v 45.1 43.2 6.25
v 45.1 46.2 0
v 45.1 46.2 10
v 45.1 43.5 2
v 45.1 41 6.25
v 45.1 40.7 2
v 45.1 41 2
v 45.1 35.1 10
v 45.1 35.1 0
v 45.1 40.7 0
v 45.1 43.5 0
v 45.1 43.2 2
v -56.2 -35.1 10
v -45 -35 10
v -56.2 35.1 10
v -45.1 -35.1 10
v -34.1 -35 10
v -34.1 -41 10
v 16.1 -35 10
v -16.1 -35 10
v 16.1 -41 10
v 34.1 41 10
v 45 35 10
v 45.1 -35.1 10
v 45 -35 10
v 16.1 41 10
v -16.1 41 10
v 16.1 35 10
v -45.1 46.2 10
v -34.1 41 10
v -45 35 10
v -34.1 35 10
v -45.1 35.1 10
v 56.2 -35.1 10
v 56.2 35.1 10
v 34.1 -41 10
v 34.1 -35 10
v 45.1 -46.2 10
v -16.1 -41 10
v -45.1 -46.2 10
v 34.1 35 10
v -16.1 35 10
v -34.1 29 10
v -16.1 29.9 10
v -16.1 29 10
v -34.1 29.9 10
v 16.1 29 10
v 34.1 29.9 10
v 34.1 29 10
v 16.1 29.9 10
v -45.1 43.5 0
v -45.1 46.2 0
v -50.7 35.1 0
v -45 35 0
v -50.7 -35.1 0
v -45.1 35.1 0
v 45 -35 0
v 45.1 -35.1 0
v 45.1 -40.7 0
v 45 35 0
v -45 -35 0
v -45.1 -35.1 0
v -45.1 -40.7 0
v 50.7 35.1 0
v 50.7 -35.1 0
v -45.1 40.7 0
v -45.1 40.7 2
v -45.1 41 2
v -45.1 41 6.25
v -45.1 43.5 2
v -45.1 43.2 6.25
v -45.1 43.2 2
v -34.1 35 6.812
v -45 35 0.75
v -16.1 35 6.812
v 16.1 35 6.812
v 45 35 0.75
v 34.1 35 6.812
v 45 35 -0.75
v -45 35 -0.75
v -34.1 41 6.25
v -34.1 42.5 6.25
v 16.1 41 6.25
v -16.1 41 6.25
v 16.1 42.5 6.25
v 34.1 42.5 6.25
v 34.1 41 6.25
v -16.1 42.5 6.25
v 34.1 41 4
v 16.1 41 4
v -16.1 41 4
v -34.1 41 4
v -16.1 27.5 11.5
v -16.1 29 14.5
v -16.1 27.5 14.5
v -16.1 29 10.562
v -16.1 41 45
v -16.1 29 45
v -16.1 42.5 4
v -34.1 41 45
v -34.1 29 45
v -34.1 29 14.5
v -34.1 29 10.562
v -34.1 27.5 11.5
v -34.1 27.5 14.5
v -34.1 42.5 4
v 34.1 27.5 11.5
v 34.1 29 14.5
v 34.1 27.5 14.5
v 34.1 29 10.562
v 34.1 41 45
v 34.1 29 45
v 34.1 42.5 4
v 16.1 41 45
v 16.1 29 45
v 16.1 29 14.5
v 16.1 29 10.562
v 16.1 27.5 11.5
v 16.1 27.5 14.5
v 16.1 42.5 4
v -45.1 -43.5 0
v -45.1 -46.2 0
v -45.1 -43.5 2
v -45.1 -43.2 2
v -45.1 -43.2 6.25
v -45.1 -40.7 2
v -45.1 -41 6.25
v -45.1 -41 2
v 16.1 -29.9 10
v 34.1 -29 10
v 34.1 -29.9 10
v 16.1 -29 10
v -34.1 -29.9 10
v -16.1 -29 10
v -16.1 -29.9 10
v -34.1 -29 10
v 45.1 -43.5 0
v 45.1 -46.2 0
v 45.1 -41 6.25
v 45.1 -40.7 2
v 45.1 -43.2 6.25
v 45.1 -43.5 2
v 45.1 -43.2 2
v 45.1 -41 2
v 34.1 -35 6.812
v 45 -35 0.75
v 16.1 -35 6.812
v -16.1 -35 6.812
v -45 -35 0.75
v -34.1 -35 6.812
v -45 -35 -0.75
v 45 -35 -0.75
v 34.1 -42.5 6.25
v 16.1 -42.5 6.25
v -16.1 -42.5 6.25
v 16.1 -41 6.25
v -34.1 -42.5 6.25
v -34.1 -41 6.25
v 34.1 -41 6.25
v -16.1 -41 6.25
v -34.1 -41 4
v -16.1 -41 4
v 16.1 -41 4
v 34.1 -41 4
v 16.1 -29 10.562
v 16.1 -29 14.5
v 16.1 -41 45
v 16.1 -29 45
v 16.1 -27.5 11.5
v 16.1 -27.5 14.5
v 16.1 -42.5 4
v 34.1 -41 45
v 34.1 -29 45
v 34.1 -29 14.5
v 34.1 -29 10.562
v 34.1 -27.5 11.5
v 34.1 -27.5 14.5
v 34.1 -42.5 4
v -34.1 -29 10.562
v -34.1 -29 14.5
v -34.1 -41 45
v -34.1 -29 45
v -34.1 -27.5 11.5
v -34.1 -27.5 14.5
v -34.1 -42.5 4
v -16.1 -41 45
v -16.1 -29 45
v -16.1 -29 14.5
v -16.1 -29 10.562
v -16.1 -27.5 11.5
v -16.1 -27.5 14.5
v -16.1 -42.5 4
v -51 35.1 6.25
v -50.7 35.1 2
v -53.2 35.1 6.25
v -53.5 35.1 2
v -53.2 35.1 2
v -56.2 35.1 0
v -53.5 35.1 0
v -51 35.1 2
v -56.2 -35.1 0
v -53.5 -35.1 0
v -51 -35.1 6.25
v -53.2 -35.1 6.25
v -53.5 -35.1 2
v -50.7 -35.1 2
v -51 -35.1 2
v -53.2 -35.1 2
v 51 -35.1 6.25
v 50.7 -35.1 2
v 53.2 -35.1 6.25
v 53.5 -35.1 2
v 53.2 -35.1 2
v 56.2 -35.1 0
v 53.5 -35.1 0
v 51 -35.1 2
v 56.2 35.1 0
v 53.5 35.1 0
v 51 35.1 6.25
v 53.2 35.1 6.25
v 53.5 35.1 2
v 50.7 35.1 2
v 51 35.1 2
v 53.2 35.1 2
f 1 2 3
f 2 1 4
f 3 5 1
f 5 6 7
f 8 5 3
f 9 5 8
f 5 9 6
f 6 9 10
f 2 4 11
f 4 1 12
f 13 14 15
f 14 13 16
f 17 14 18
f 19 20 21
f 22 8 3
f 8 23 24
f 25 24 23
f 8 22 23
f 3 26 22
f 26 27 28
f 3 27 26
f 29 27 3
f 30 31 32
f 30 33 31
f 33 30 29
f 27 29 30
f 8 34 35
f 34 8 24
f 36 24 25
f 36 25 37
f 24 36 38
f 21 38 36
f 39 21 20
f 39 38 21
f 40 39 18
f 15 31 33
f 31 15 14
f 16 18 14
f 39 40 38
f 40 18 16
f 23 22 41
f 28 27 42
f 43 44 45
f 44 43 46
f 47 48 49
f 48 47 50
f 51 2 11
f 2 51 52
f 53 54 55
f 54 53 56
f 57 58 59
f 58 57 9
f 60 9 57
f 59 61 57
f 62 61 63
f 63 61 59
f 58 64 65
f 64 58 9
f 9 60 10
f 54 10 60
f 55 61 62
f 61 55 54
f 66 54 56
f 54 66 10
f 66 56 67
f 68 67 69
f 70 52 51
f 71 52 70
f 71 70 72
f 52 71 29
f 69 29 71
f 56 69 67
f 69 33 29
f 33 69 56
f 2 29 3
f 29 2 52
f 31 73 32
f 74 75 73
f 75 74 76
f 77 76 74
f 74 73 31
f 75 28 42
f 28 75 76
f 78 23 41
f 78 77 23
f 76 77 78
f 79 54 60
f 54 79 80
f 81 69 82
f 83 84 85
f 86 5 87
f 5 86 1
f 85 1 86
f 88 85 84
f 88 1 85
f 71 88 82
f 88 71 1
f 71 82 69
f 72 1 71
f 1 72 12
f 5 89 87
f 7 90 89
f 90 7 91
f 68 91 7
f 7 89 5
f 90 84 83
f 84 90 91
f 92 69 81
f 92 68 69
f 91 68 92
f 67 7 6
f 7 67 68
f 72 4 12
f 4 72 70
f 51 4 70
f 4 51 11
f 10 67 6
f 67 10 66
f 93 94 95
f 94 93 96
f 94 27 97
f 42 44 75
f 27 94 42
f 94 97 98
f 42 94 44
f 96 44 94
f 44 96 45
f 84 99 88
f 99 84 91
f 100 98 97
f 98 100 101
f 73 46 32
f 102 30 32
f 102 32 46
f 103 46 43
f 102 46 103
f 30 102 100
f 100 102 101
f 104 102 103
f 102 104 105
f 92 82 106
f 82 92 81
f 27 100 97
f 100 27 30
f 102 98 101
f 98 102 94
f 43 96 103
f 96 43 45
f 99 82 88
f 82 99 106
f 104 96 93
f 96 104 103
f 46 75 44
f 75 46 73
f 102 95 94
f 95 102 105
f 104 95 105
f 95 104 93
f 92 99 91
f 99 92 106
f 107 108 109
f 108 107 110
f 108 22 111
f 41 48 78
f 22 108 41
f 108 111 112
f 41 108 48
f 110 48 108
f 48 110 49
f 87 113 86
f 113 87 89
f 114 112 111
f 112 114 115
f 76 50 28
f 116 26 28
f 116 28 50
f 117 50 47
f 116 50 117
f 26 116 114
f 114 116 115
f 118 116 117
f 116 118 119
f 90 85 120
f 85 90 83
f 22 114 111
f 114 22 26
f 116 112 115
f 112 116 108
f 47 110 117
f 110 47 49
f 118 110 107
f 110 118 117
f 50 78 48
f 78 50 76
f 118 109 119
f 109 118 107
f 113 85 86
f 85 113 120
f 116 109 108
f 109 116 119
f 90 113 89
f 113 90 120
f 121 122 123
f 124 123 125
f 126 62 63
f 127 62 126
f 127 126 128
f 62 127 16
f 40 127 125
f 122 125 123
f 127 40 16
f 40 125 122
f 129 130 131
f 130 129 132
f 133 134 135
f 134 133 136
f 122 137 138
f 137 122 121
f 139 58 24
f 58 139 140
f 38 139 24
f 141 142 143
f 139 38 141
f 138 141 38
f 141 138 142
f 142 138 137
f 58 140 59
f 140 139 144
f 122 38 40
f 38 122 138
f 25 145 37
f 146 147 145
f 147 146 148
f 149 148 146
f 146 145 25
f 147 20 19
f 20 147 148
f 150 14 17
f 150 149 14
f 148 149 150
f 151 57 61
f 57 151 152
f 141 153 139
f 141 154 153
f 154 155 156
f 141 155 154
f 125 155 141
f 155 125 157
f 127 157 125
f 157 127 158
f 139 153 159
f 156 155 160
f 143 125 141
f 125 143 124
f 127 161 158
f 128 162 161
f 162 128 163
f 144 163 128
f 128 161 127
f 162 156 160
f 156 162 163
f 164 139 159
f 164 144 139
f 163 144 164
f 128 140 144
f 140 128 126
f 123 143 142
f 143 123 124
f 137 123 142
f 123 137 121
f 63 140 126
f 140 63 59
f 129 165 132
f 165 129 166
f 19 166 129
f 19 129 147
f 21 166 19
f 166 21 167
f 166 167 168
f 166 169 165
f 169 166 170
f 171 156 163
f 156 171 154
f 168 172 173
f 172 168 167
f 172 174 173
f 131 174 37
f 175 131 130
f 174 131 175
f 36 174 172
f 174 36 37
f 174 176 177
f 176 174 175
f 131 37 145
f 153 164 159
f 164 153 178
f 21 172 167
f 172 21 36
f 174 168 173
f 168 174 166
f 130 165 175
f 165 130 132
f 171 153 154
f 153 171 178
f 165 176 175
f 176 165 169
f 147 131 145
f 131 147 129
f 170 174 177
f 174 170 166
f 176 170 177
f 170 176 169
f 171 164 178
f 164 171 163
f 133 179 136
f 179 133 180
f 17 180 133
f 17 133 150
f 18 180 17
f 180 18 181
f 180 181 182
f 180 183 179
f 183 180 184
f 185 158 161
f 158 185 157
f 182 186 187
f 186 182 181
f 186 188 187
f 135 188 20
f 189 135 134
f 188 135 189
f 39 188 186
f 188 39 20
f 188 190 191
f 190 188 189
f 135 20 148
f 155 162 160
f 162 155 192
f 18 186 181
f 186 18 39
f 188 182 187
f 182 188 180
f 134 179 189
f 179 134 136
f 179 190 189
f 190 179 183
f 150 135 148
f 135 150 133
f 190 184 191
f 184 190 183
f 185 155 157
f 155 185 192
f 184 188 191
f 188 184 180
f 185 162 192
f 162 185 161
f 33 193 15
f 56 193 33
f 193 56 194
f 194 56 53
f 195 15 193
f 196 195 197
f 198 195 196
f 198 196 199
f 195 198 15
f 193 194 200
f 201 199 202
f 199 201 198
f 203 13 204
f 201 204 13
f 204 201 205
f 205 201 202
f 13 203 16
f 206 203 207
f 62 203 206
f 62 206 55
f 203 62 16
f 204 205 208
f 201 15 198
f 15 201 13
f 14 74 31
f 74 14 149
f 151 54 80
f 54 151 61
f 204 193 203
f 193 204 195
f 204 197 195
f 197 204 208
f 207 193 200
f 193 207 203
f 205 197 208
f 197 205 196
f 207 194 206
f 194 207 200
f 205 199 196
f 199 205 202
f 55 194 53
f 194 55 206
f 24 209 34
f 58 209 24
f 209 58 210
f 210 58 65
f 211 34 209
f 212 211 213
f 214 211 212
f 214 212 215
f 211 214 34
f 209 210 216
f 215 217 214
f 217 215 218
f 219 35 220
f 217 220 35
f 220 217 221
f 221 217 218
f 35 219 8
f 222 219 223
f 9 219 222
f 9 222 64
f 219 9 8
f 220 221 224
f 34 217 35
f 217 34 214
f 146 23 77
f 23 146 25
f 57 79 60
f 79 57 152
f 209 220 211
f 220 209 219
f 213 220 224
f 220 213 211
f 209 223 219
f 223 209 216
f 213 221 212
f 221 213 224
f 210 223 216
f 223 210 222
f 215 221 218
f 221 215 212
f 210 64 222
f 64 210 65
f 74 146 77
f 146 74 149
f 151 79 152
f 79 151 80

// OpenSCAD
// 4-piece PCB perimeter frame: 4 U-channel rails (glue-on)
// - PCB slides into the U on each rail
// - Print 2x plain rails + 2x leg rails
// - Configure which sides get legs by printing the leg variant for those sides
//
// PCB: 90 x 70 x 1.5 mm
// Units: mm

// ---------------- PCB ----------------
pcb_x  = 90;
pcb_y  = 70;
pcb_t  = 1.5;

// ---------------- Fit ----------------
slot_clear_xy = 0.35;   // clearance for PCB thickness slot width (per side in slot)
slot_clear_z  = 0.25;   // clearance depth-wise (not critical here)
end_clear     = 0.2;    // extra length so rail doesn't bind at ends

// ---------------- Rail geometry ----------------
rail_len_x = pcb_x + end_clear;  // rail length for top/bottom pieces
rail_len_y = pcb_y + end_clear;  // rail length for left/right pieces

rail_depth = 10.0;      // how far rail extends "back" (Z direction) from PCB plane
rail_face  = 3.0;       // front lip thickness (toward viewer)
rail_wall  = 3.0;       // wall thickness around slot
slot_depth = 6.0;       // how deep PCB inserts into the rail (>= pcb_t)

// Slot (U-channel) size
slot_w = pcb_t + 2*slot_clear_xy;        // opening thickness for PCB
slot_h = slot_depth + slot_clear_z;      // insertion depth into rail

// ---------------- Legs (optional on two rails) ----------------
leg_enable = true;
leg_width  = 18.0;   // along rail length
leg_th     = 3.0;    // thickness
leg_len    = 35.0;   // how far it sticks out behind (Z)
leg_drop   = 12.0;   // how far down (Y-) the foot goes
leg_offset = 20.0;   // from rail end toward center

// ---------------- Rendering ----------------
part = "assembly"; // "rail_plain_x", "rail_plain_y", "rail_leg_x", "rail_leg_y", "assembly"

// ------------- Core rail (length L) -------------
// Coordinate system for rail:
// X = along rail length
// Y = vertical (up/down when standing)
// Z = depth (front/back). PCB sits at Z=0 plane; rail extends +Z behind.
module rail(L, with_leg=false) {

  // Outer box of rail
  // Height in Y: make it look like a picture frame edge
  outer_y = rail_face + rail_wall + slot_w + rail_wall; // total "height" around slot
  outer_z = rail_depth;                                  // depth/back

  // Slot center in Y: keep some "face" above the slot so it looks framed
  // Slot runs along X, at Z near the front.
  slot_y0 = rail_face + rail_wall; // bottom of slot region in Y
  slot_z0 = 0.0;                   // slot starts at front face (Z=0)

  difference() {
    // outer solid
    translate([0, outer_y/2, outer_z/2])
      cube([L, outer_y, outer_z], center=true);

    // carve slot (U-channel) from the front (Z=0) into depth
    translate([0, slot_y0 + slot_w/2, slot_h/2])
      cube([L+0.6, slot_w, slot_h], center=true);

    // open the front window area so PCB can slide in from side ends cleanly
    // (small chamfer substitute by widening mouth a bit)
    translate([0, slot_y0 + slot_w/2, 1.0])
      cube([L+0.6, slot_w + 0.6, 2.0], center=true);
  }

  // Optional leg feature (a simple rear foot)
  if (with_leg && leg_enable) {
    // place two legs near ends for stability
    for (sx = [-1, 1]) {
      x = sx*(L/2 - leg_offset);

      // foot plate behind rail
      translate([x, (rail_face + rail_wall) - leg_drop/2, rail_depth + leg_len/2])
        cube([leg_width, leg_drop, leg_len], center=true);

      // small brace up to the rail (triangulated-ish via hull)
      hull() {
        translate([x, (rail_face + rail_wall), rail_depth*0.55])
          cube([leg_width, leg_th, leg_th], center=true);
        translate([x, (rail_face + rail_wall) - leg_drop, rail_depth + leg_th])
          cube([leg_width, leg_th, leg_th], center=true);
      }
    }
  }
}

// ------------- Assembly preview -------------
module assembly_preview() {
  // Show PCB as a translucent plate in the middle
  color([0,0.6,0,0.35])
    translate([0,0,0])
      cube([pcb_x, pcb_y, pcb_t], center=true);

  // Place rails around PCB edges (glue-on concept)
  // Top rail (X length)
  color("lightgray")
    translate([0, pcb_y/2, 0])
      rotate([0,0,0])
        rail(rail_len_x, with_leg=true); // choose legs on top/bottom OR left/right

  // Bottom rail
  color("lightgray")
    translate([0, -pcb_y/2, 0])
      rotate([0,0,180])
        rail(rail_len_x, with_leg=true);

  // Left rail (Y length) - rotate 90 degrees
  color("gainsboro")
    translate([-pcb_x/2, 0, 0])
      rotate([0,0,90])
        rail(rail_len_y, with_leg=false);

  // Right rail
  color("gainsboro")
    translate([pcb_x/2, 0, 0])
      rotate([0,0,-90])
        rail(rail_len_y, with_leg=false);
}

// ------------- Part selection -------------
if (part == "rail_plain_x") rail(rail_len_x, with_leg=false);
if (part == "rail_plain_y") rail(rail_len_y, with_leg=false);
if (part == "rail_leg_x")   rail(rail_len_x, with_leg=true);
if (part == "rail_leg_y")   rail(rail_len_y, with_leg=true);
if (part == "assembly")     assembly_preview();
